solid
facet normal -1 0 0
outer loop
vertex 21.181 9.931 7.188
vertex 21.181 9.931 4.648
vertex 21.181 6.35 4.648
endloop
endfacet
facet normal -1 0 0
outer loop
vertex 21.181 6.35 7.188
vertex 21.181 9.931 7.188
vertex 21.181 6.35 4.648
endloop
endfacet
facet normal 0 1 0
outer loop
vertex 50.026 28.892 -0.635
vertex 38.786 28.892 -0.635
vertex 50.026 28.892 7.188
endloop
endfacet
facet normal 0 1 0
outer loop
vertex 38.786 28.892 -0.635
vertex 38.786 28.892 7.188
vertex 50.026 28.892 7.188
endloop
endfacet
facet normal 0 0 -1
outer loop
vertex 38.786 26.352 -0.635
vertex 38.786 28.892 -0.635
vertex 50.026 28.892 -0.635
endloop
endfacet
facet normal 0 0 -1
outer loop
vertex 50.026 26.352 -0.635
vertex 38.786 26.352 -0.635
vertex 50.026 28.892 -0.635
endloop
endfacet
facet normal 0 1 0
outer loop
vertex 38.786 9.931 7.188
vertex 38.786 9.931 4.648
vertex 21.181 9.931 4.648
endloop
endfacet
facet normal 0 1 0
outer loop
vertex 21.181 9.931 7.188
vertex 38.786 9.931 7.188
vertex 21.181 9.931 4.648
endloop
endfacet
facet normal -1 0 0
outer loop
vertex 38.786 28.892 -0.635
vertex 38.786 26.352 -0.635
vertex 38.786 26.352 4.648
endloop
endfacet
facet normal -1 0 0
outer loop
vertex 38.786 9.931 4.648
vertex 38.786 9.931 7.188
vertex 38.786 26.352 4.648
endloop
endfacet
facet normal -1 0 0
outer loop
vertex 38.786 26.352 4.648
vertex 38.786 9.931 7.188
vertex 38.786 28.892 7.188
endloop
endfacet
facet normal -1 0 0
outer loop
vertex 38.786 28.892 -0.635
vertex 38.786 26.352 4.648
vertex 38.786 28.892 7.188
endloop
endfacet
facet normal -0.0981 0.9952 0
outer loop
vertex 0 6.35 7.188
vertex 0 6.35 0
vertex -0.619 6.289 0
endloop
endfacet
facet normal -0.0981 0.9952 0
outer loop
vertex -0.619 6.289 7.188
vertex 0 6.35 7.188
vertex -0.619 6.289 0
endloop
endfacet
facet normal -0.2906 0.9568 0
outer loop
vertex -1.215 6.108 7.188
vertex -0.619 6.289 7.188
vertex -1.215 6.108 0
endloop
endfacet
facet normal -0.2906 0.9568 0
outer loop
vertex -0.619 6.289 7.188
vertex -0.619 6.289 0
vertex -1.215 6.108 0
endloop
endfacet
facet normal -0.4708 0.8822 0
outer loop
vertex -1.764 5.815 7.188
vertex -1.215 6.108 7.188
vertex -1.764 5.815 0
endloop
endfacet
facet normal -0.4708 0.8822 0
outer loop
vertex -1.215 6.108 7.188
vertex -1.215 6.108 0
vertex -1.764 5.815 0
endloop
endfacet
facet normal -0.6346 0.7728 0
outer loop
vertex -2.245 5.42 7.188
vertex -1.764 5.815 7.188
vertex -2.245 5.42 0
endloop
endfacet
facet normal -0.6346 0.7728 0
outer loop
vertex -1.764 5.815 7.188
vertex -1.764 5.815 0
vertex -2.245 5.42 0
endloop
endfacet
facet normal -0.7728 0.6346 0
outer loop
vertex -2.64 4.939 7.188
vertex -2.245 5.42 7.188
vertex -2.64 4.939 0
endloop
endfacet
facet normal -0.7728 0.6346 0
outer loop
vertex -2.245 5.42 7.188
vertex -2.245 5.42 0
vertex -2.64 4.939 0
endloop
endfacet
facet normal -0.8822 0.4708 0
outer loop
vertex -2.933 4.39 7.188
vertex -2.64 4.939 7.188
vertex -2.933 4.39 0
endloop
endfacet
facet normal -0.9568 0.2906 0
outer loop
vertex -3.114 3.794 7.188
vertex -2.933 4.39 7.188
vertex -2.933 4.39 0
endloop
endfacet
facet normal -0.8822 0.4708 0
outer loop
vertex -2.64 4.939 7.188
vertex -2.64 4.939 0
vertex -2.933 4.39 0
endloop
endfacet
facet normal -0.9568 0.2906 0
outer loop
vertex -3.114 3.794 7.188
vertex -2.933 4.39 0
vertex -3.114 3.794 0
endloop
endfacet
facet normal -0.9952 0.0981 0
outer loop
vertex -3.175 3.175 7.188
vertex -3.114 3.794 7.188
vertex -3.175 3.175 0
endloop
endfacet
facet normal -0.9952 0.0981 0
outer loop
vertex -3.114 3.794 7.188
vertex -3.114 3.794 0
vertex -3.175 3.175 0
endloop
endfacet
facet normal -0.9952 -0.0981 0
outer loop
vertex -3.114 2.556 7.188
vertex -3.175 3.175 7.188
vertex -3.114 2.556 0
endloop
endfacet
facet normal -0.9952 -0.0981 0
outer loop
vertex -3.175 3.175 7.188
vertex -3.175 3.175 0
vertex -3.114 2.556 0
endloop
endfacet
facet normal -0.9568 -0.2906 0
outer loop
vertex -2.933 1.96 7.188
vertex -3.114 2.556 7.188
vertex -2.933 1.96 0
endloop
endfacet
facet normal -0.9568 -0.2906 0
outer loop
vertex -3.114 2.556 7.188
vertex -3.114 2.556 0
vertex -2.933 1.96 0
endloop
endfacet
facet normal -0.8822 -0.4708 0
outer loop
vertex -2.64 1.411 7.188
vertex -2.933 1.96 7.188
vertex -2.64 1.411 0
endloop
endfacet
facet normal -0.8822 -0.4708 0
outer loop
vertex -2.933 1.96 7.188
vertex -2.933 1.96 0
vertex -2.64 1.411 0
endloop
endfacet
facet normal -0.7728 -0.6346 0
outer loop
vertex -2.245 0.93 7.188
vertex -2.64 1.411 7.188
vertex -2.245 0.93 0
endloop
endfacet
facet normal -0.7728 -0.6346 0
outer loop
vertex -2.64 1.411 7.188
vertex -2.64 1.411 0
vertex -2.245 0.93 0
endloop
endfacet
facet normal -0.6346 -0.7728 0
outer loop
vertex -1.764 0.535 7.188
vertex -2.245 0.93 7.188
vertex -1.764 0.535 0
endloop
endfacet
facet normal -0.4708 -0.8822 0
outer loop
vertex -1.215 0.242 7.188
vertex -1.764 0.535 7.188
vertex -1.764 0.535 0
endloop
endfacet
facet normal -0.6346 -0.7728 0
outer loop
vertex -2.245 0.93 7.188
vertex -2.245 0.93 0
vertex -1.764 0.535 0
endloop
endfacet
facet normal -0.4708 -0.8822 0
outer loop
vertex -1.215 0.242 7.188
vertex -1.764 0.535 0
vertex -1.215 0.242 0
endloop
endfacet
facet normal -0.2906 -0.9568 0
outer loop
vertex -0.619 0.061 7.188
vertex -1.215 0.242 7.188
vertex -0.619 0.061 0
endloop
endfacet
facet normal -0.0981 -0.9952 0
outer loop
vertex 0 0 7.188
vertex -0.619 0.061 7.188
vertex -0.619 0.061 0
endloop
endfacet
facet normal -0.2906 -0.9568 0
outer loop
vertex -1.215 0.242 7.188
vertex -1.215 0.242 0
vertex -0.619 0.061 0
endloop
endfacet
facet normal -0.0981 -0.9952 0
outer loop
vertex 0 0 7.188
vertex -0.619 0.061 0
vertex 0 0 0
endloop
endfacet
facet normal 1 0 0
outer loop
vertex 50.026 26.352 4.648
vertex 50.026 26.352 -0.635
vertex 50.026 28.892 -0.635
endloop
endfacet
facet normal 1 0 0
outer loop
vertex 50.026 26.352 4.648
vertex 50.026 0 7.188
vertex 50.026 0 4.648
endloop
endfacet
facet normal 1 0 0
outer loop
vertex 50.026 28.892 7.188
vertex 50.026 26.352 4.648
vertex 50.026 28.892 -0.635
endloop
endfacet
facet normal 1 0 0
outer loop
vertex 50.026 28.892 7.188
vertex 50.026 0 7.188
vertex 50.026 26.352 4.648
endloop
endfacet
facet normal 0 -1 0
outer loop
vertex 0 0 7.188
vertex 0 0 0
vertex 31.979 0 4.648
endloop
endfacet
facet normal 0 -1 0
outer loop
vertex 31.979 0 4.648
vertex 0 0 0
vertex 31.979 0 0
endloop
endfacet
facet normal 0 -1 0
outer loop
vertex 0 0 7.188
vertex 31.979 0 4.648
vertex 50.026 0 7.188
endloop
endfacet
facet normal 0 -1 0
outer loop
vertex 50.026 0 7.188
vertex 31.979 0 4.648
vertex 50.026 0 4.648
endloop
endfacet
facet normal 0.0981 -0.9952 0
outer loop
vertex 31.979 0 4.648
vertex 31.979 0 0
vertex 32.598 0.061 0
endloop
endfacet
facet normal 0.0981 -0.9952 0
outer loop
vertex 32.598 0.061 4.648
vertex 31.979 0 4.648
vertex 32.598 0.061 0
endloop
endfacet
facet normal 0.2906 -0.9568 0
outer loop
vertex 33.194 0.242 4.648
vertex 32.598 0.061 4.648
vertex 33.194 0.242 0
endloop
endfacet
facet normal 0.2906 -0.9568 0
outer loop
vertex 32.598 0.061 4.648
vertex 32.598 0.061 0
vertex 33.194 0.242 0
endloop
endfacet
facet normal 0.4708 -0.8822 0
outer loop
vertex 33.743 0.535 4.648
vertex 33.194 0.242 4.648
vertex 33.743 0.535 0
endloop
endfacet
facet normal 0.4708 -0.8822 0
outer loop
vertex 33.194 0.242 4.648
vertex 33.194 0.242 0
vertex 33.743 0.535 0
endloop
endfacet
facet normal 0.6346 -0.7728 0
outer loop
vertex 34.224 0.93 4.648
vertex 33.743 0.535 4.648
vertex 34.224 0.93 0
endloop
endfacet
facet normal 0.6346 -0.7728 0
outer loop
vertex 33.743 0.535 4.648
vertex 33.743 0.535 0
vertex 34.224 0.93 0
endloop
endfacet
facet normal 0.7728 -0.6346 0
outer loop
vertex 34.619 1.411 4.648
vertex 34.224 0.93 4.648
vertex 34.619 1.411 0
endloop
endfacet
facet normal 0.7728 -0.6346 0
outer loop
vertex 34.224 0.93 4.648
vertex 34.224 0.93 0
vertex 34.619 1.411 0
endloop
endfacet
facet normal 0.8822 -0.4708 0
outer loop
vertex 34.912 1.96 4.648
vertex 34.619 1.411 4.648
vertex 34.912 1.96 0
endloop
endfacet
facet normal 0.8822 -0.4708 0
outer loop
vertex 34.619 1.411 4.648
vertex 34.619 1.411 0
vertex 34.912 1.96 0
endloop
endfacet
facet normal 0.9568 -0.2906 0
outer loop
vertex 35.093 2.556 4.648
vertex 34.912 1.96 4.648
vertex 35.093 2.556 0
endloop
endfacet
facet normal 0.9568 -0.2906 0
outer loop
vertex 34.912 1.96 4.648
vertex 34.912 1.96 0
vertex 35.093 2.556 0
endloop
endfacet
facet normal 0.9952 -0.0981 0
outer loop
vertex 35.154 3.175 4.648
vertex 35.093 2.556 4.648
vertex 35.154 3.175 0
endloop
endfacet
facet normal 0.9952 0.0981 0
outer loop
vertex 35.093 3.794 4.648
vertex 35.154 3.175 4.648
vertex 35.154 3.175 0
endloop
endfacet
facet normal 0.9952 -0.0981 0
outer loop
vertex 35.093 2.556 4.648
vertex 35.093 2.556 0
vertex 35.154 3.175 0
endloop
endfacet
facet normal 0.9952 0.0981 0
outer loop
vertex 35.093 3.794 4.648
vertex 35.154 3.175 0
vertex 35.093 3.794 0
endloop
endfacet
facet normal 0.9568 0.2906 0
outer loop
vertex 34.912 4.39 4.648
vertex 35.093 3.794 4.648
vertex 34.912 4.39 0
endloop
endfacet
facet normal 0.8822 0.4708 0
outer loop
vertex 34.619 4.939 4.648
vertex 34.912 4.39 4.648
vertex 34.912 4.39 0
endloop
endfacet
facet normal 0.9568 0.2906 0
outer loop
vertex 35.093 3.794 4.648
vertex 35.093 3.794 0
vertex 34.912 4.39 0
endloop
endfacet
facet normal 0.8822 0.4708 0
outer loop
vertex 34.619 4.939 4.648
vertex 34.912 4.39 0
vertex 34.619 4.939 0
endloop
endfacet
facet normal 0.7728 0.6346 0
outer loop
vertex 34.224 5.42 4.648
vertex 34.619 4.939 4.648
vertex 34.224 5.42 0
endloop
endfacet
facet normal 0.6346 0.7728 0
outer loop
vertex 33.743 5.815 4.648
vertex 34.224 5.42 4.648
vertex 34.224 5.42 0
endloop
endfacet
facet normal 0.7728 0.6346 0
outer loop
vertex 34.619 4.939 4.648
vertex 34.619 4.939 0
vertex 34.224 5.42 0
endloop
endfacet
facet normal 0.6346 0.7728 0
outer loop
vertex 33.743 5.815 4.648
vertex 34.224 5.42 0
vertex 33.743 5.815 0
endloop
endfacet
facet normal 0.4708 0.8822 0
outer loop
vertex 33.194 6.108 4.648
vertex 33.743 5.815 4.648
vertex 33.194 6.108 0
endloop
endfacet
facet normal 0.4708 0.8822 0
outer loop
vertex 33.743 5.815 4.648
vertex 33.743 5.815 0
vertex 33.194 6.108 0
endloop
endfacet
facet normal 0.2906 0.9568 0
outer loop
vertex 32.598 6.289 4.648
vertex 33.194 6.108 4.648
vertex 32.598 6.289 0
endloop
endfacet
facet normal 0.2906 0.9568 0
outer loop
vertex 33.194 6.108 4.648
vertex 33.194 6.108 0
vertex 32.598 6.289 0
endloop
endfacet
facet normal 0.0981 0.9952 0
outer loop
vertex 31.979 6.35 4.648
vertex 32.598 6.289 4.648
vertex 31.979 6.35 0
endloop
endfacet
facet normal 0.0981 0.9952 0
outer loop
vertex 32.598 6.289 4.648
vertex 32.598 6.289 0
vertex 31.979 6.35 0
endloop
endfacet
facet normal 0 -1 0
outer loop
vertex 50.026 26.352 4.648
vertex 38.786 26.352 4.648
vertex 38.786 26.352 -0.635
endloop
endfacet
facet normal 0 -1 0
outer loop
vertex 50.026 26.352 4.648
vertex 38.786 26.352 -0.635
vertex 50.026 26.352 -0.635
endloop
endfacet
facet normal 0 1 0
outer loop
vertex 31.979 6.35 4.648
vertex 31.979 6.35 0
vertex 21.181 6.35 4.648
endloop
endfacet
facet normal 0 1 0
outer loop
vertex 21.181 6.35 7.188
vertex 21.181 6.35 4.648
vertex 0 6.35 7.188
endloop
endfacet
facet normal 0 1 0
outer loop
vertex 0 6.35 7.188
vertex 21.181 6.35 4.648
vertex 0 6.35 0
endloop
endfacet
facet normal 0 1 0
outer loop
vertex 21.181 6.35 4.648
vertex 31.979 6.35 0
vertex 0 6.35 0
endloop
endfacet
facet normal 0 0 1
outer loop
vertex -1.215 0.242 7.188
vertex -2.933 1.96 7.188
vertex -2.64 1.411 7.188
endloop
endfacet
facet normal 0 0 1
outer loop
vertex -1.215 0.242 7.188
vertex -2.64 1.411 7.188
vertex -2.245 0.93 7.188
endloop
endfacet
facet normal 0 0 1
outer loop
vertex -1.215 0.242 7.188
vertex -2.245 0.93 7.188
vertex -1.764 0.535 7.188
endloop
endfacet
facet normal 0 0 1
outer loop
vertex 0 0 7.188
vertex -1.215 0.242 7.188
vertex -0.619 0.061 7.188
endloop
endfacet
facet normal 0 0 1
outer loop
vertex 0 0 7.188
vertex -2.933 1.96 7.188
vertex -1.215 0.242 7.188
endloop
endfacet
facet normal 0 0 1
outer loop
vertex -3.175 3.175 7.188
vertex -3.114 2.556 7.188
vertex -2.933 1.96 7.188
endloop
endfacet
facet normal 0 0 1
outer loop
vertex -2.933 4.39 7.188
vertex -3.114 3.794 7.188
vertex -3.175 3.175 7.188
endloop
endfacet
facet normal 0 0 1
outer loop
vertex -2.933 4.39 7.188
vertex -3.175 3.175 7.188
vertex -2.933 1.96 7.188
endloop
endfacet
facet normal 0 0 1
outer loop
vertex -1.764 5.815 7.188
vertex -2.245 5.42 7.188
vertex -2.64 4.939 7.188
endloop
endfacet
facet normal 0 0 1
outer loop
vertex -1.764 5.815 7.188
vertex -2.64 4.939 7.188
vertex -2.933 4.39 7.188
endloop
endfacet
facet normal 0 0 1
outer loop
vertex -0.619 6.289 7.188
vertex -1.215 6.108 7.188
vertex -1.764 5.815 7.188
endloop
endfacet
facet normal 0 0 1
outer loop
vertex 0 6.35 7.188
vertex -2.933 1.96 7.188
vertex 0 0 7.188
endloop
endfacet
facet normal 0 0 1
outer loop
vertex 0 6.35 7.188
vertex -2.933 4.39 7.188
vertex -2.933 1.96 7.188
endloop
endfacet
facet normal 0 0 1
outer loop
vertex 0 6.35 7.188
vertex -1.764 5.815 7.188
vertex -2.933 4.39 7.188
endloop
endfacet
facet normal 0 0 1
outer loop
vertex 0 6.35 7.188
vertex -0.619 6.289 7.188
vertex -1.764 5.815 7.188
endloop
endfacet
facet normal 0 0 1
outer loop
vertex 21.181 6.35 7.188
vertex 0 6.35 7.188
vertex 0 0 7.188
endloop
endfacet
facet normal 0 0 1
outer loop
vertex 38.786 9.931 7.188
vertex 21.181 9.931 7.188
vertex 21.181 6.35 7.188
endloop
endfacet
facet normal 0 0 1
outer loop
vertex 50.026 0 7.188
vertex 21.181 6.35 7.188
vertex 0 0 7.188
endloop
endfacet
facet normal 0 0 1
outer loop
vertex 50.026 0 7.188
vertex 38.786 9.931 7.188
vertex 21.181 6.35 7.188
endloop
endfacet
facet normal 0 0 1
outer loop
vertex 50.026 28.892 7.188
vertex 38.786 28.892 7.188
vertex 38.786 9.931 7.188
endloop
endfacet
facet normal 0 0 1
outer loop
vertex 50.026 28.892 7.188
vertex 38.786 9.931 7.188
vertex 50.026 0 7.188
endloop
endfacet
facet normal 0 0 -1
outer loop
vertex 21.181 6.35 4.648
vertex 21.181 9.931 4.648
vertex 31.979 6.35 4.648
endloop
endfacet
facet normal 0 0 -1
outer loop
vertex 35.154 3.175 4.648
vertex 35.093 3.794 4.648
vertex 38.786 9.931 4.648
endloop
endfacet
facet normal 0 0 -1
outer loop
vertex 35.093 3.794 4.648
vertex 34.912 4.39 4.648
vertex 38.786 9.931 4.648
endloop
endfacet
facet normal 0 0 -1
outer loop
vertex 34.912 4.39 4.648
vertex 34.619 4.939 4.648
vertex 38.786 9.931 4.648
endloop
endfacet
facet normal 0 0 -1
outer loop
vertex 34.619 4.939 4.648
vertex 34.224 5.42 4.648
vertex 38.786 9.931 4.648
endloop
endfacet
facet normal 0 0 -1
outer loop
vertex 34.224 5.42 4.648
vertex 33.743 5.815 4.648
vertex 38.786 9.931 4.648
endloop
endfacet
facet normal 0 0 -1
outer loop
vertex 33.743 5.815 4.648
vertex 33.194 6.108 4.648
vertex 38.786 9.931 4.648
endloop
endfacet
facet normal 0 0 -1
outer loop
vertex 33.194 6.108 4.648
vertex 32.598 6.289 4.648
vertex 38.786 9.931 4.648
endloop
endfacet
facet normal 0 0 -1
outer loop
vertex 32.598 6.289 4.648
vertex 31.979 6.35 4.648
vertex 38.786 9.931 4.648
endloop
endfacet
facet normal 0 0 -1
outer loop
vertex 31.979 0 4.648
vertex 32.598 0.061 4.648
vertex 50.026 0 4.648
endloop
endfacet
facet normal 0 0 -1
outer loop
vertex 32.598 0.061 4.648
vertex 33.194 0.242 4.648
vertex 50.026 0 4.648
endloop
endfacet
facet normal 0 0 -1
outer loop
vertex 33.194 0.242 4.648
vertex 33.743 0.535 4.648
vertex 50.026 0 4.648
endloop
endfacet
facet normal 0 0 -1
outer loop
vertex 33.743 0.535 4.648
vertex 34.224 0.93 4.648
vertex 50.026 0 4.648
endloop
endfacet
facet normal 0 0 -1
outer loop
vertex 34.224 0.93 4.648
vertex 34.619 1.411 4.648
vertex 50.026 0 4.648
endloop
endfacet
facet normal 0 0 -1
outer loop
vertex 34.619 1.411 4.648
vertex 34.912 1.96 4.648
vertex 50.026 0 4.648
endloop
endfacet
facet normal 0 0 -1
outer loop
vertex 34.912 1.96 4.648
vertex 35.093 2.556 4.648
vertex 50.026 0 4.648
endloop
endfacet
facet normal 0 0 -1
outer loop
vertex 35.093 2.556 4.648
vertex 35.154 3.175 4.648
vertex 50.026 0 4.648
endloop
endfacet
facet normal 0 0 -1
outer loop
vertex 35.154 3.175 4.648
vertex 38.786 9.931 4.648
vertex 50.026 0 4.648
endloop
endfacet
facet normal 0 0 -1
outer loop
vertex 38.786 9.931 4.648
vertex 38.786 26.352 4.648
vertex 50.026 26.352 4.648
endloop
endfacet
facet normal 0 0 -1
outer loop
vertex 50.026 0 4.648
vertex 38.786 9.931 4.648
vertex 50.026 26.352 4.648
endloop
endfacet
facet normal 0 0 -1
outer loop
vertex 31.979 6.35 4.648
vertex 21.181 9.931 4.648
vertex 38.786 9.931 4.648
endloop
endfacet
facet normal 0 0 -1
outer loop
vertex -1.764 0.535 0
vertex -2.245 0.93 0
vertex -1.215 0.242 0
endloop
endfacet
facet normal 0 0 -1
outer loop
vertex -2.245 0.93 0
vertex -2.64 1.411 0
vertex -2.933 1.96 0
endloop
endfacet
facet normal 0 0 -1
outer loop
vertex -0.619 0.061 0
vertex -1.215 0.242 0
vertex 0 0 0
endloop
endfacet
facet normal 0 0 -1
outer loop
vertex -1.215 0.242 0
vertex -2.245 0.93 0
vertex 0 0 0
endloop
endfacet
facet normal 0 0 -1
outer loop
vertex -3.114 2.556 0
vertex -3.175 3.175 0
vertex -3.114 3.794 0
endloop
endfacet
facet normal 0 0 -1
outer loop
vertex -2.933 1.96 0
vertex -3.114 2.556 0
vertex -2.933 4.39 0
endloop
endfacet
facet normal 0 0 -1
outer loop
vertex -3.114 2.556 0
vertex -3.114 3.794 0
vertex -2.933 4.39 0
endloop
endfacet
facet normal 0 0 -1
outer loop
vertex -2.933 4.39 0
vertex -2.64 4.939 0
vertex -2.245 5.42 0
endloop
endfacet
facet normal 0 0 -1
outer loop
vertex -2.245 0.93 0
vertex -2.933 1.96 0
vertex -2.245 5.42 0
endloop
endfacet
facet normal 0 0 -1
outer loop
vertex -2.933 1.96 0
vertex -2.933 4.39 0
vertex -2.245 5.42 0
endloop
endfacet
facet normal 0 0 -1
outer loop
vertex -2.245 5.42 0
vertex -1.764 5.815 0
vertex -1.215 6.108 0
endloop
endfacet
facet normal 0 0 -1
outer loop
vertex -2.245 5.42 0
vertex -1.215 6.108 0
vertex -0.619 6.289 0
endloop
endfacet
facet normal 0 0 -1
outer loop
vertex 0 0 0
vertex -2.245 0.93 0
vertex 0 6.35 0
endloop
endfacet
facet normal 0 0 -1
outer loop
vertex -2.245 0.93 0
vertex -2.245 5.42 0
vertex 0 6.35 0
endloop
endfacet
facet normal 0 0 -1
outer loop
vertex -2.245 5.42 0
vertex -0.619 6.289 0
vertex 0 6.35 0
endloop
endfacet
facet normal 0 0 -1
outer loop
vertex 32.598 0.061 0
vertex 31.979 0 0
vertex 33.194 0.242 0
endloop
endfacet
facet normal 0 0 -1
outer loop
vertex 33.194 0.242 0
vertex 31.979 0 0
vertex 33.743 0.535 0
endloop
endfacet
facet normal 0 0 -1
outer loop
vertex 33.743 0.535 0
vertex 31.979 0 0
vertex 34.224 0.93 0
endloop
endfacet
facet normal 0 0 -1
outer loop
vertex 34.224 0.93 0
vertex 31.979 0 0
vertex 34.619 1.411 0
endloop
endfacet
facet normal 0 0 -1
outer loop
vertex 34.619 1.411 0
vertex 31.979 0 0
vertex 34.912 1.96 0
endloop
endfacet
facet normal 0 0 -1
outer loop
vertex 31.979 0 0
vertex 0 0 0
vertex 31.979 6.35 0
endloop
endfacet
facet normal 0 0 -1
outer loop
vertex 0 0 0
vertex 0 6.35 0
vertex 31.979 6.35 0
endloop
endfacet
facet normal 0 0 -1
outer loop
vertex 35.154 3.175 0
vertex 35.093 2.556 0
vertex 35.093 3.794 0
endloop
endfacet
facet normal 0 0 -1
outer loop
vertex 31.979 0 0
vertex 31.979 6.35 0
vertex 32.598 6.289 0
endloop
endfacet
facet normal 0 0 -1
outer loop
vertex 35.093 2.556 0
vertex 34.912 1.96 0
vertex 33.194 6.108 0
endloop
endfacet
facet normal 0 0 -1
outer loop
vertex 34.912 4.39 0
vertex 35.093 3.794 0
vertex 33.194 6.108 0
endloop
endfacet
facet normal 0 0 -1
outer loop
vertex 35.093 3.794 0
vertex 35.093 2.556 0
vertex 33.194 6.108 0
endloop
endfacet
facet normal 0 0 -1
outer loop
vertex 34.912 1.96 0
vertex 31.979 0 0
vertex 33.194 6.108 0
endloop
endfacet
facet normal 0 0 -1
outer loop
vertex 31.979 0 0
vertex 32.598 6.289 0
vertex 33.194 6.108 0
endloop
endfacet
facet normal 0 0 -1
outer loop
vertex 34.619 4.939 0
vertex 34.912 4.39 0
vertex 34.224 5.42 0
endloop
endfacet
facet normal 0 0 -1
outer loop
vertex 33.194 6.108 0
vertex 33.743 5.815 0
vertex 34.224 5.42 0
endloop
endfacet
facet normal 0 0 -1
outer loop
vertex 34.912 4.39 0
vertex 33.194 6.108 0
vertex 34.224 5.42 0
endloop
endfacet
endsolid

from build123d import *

# Parameters (mm, degrees)
F1_DEPTH = 4.6482
F2_W     = 11.2398419182
F2_H     = 2.54
F3_DEPTH = 2.54
F4_DEPTH = 5.2832


with BuildPart() as f1:
    # F0 (on Top) → F1 (new body)
    with BuildSketch(Plane.XY):
        with BuildLine():
            ThreePointArc((0, 6.35), (-3.175, 3.175), (0, 0))
            Line((0, 0), (31.9786, 0))
            ThreePointArc((31.9786, 0), (35.1536, 3.175), (31.9786, 6.35))
            Line((31.9786, 6.35), (0, 6.35))
        make_face()
    extrude(amount=F1_DEPTH)

    # F2 (on face) → F3 (join)
    with BuildSketch(Plane.XY.offset(4.6482)):
        Polygon((38.7858, 9.9314), (38.7858, 0), (50.0256419182, 0), (50.0256419182, 26.3525), (38.7858, 26.3525), align=None)
        with BuildLine():
            Line((31.9786, 0), (35.1536, 0))
            Line((35.1536, 0), (38.7858, 0))
            Line((38.7858, 0), (38.7858, 9.9314))
            Line((38.7858, 9.9314), (35.1536, 9.9314))
            Line((35.1536, 9.9314), (21.18106, 9.9314))
            Line((21.18106, 9.9314), (21.18106, 6.35))
            Line((21.18106, 6.35), (31.9786, 6.35))
            ThreePointArc((31.9786, 6.35), (35.1536, 3.175), (31.9786, 0))
        make_face()
        with BuildLine():
            Line((21.18106, 0), (31.9786, 0))
            ThreePointArc((31.9786, 0), (35.1536, 3.175), (31.9786, 6.35))
            Line((31.9786, 6.35), (21.18106, 6.35))
            Line((21.18106, 6.35), (21.18106, 0))
        make_face()
        with Locations((44.4057209591, 27.6225)):
            Rectangle(F2_W, F2_H)
        with BuildLine():
            Line((0, 0), (21.18106, 0))
            Line((21.18106, 0), (21.18106, 6.35))
            Line((21.18106, 6.35), (0, 6.35))
            ThreePointArc((0, 6.35), (-3.175, 3.175), (0, 0))
        make_face()
    extrude(amount=F3_DEPTH)

    # F2 (on face) → F4 (join)
    with BuildSketch(Plane.XY.offset(4.6482)):
        with Locations((44.4057209591, 27.6225)):
            Rectangle(F2_W, F2_H)
    extrude(amount=-F4_DEPTH)


solid = f1.part
